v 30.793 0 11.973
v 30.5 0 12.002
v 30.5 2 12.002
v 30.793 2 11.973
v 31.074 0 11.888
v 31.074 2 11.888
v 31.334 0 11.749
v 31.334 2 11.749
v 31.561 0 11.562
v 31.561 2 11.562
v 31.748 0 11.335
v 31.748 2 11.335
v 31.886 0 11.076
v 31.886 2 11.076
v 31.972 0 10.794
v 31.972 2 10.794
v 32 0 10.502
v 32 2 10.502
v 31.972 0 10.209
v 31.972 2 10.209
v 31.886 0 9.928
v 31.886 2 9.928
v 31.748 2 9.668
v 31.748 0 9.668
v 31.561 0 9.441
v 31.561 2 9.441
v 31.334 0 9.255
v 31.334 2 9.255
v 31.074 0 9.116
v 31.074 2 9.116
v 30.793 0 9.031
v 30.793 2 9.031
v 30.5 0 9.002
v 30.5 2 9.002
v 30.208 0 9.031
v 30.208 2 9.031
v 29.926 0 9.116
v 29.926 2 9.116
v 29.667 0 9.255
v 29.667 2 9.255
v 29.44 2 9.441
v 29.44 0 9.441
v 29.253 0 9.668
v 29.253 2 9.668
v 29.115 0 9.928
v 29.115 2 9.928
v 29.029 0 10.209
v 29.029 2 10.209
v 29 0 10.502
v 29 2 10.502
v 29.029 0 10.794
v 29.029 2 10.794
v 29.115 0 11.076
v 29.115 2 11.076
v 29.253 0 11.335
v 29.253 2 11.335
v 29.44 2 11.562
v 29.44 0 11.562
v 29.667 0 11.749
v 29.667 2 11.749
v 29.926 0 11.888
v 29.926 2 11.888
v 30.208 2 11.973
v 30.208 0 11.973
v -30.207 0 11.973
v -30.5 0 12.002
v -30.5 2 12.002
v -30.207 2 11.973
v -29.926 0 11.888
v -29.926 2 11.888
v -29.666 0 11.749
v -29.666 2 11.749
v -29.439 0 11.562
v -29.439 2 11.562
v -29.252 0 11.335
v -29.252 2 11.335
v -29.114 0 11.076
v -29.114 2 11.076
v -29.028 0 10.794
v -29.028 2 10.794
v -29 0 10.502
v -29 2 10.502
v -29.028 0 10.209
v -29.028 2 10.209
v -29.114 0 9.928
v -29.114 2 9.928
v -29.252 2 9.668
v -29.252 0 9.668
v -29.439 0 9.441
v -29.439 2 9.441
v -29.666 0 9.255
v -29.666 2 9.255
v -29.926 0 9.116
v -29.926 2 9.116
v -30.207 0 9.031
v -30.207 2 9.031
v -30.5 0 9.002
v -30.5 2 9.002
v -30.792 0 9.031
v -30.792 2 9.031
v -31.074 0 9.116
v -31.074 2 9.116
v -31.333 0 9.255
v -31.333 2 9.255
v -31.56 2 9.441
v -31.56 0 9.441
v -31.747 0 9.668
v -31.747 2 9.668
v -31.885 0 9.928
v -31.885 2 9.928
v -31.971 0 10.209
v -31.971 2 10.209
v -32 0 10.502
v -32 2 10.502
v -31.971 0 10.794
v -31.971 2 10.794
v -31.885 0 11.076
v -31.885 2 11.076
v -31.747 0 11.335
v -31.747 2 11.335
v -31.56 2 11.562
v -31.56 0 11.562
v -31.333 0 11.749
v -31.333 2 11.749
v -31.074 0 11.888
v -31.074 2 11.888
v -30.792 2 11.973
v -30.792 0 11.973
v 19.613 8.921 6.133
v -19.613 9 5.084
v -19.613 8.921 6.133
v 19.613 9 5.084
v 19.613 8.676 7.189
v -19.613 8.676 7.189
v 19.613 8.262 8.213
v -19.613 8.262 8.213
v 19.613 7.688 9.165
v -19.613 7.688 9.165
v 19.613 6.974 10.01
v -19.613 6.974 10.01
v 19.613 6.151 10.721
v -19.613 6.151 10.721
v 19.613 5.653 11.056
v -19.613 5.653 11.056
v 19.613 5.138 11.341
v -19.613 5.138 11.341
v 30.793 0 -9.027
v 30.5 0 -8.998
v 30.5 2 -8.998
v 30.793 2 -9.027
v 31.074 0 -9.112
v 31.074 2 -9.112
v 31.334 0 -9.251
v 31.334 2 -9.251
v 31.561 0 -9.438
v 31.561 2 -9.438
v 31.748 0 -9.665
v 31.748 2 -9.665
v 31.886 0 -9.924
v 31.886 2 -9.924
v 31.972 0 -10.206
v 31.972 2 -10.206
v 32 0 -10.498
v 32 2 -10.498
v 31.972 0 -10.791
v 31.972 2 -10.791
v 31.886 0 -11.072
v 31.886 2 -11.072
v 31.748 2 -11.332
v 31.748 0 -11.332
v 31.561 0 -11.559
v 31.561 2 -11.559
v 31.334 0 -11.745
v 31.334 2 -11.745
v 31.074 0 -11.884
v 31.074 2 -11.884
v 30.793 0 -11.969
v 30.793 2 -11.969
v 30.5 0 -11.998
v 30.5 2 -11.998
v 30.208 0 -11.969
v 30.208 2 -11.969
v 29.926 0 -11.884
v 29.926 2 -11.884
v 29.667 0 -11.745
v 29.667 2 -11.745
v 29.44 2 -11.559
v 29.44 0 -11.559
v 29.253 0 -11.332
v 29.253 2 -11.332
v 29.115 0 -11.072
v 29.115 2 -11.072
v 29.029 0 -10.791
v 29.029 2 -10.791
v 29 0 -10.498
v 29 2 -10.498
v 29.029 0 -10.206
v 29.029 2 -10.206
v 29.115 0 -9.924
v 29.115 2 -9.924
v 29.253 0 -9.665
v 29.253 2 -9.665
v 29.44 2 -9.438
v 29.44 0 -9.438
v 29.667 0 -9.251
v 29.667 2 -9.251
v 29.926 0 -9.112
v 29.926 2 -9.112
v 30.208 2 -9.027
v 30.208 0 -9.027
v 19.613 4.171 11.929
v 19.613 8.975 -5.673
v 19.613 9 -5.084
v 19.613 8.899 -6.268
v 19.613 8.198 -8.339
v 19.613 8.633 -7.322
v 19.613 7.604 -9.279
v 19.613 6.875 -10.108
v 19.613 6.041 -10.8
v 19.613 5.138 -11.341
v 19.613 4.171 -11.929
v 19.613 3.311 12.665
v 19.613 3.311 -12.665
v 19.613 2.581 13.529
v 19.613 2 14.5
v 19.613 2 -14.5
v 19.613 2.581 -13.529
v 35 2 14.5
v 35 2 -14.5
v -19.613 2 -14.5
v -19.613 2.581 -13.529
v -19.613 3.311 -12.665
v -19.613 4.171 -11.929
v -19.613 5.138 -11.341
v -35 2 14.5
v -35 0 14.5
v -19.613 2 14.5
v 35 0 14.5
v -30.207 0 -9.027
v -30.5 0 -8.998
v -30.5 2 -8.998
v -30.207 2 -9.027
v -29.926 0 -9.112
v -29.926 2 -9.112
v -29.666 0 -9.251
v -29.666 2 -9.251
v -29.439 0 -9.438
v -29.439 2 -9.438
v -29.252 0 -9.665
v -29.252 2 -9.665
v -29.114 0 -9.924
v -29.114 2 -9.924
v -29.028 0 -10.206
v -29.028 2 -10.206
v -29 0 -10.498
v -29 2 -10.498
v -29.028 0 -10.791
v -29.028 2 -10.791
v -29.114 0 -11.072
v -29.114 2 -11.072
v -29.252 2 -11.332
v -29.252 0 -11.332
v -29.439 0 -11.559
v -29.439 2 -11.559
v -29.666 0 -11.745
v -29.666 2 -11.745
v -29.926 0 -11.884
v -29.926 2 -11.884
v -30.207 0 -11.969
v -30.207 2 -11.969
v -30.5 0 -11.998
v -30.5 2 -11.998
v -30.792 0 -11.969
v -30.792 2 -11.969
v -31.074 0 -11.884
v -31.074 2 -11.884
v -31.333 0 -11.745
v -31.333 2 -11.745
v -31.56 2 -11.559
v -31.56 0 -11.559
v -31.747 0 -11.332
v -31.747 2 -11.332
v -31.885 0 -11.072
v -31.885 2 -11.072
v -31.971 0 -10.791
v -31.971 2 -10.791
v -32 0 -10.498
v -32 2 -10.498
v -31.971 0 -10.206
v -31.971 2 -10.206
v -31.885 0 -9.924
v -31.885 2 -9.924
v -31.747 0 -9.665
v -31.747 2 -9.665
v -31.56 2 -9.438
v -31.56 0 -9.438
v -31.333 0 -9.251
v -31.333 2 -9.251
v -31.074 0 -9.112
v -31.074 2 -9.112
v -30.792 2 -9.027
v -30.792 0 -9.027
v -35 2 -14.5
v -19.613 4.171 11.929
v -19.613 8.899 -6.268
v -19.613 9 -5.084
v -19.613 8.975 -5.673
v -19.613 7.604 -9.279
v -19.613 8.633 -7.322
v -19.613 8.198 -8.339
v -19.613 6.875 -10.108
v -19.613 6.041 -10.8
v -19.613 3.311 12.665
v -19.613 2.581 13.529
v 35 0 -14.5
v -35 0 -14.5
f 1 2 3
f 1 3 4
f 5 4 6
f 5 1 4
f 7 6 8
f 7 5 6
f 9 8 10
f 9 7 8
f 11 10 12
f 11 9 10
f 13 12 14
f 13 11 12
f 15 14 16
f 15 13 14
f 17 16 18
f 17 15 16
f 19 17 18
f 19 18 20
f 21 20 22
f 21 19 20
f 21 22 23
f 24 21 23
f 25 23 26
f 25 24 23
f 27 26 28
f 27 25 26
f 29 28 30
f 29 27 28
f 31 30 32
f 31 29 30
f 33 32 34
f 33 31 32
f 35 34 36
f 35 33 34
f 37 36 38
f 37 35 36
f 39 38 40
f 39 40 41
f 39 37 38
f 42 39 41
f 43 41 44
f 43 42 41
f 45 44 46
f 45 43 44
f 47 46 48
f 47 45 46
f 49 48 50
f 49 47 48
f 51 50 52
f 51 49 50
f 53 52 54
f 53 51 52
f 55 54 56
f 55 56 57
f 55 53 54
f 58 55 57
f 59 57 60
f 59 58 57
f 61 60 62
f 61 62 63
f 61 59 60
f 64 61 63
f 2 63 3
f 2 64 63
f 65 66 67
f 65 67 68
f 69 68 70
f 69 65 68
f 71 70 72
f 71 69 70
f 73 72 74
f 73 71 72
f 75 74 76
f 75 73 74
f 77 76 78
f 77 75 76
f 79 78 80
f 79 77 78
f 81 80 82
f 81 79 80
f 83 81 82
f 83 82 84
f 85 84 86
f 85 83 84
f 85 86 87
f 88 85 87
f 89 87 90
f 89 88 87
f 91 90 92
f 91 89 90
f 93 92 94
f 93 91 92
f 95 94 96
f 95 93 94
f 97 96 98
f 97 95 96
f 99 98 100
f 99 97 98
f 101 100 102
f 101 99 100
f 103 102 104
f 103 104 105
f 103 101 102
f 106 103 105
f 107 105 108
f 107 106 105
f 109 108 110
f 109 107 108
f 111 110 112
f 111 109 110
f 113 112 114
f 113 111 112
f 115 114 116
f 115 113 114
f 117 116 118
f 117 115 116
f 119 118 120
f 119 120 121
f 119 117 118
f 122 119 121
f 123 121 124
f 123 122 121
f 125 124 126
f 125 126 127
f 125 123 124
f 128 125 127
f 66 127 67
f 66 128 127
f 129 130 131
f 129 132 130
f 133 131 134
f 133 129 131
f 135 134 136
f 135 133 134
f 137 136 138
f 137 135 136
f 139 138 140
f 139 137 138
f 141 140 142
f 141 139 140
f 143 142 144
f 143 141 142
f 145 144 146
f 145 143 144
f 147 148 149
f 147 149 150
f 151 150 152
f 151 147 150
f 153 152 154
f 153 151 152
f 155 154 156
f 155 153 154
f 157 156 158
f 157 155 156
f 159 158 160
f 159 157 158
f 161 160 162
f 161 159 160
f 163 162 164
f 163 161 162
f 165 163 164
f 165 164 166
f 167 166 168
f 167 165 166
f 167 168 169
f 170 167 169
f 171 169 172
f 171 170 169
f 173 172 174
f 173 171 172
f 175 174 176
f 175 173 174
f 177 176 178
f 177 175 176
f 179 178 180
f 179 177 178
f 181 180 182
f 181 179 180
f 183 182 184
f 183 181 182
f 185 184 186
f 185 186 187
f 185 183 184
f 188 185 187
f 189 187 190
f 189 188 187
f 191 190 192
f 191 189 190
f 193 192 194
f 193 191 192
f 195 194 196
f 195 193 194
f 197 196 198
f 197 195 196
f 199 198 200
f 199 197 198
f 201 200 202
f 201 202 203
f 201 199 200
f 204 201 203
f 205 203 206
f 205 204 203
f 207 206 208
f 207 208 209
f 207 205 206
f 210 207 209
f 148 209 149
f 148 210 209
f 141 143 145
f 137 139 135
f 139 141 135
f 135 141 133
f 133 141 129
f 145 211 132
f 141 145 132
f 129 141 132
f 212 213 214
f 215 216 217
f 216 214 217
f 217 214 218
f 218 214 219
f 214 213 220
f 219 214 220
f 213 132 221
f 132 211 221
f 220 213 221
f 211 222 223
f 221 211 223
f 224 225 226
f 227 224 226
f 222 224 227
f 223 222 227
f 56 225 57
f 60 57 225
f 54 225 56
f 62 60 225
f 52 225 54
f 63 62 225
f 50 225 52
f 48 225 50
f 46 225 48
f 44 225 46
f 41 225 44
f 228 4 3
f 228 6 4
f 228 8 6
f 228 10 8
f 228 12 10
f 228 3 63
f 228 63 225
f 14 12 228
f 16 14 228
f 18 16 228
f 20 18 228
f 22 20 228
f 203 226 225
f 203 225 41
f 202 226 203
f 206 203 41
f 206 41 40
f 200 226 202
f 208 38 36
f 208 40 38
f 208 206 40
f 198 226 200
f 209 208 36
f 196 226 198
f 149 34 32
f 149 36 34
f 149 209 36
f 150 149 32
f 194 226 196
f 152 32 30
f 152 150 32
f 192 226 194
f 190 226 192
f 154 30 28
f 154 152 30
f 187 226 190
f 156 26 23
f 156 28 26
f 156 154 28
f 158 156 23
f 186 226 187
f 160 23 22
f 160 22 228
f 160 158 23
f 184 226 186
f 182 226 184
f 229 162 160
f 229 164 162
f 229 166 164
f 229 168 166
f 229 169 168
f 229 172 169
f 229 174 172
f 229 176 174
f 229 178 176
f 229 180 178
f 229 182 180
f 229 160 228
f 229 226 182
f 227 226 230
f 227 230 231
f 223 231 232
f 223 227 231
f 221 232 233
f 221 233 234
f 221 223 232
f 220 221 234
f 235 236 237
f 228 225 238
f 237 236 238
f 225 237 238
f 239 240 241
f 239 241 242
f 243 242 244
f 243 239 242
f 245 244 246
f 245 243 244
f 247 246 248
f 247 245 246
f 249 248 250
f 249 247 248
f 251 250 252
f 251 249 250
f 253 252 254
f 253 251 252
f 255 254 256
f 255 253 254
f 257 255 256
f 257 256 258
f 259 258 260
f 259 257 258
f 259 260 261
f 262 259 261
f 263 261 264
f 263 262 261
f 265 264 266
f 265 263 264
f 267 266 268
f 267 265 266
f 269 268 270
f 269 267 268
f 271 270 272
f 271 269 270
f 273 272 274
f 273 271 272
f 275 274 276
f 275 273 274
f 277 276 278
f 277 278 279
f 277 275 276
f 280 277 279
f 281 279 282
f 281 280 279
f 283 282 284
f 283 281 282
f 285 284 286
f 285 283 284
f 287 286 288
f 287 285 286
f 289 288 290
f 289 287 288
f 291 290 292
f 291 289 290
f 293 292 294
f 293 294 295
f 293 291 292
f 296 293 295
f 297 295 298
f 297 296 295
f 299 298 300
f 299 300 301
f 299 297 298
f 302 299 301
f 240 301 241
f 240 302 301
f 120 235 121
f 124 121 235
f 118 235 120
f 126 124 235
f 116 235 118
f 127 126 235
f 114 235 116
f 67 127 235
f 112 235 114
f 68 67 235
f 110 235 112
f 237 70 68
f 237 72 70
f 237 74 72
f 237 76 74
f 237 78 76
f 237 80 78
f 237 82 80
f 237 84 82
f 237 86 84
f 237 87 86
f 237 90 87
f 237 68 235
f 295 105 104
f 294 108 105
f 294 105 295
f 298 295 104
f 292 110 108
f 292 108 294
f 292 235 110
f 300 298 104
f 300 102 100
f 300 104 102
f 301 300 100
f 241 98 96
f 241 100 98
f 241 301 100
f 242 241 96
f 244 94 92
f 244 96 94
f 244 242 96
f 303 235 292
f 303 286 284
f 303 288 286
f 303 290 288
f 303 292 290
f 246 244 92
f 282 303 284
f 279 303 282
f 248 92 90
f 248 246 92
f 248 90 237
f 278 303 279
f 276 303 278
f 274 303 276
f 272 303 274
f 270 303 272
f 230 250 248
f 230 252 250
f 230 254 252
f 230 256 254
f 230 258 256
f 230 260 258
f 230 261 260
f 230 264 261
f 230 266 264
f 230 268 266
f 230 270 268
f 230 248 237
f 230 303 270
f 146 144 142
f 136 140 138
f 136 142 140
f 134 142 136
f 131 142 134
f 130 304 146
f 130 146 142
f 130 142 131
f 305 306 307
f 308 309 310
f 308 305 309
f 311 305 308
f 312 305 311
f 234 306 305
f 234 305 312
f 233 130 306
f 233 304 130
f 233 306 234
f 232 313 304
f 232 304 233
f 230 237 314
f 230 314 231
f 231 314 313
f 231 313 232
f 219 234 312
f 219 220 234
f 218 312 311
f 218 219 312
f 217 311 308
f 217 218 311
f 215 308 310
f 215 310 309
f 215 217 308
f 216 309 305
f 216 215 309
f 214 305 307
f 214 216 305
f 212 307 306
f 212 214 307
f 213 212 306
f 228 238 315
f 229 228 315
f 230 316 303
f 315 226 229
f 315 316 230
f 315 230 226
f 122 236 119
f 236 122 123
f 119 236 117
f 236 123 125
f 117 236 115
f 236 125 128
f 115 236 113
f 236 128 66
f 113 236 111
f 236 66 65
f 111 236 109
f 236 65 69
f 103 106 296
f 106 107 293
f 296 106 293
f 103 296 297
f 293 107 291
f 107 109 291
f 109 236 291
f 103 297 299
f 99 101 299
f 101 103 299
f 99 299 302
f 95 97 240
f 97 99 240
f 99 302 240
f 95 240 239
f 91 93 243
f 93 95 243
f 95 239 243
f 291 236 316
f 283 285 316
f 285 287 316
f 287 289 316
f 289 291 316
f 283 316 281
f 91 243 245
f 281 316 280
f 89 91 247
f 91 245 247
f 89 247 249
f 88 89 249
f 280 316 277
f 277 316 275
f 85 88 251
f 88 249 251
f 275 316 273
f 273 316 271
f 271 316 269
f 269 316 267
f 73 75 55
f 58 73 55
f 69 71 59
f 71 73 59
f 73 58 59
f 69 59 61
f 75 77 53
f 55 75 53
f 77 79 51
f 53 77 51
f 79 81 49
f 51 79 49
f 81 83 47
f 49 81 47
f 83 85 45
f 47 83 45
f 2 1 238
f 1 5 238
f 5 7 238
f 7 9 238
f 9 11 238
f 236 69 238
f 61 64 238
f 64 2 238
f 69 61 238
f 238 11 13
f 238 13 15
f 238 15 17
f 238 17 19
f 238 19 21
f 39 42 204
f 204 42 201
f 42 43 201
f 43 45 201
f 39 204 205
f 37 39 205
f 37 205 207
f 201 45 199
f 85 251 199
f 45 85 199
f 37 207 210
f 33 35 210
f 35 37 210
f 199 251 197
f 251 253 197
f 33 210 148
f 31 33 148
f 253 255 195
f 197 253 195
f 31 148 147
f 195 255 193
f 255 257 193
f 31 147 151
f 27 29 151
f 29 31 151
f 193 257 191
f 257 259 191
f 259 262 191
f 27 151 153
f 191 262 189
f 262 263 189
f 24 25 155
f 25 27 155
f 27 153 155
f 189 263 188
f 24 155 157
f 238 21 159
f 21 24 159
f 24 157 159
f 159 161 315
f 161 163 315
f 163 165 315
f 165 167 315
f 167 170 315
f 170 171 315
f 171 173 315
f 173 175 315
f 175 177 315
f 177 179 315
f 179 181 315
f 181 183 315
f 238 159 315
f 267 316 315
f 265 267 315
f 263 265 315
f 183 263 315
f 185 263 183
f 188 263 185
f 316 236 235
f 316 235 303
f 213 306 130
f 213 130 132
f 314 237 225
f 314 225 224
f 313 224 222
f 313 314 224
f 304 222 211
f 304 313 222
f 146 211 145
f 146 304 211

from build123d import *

# Parameters (mm, degrees)
SKETCH1_W           = 70
SKETCH1_H           = 29
SKETCH1_R           = 1.5
BOSS_EXTRUDE1_DEPTH = 2
SKETCH3_W           = 39.225392784
SKETCH3_H           = 21.196798794
BOSS_EXTRUDE2_DEPTH = 7
FILLET2_R           = 7
FILLET3_R           = 7


with BuildPart() as part:
    # Sketch1 → Boss-Extrude1 (new body)
    with BuildSketch(Plane(origin=(0, 0, 0), x_dir=(1, 0, 0), z_dir=(0, 1, 0))):
        Rectangle(SKETCH1_W, SKETCH1_H)
        with Locations(Location((-30.499583195, 10.498163925, 0), (0, 0, 270))):
            Circle(SKETCH1_R, mode=Mode.SUBTRACT)
        with Locations(Location((30.500416805, 10.498163925, 0), (0, 0, 270))):
            Circle(SKETCH1_R, mode=Mode.SUBTRACT)
        with Locations(Location((-30.499583195, -10.501836075, 0), (0, 0, 270))):
            Circle(SKETCH1_R, mode=Mode.SUBTRACT)
        with Locations(Location((30.500416805, -10.501836075, 0), (0, 0, 270))):
            Circle(SKETCH1_R, mode=Mode.SUBTRACT)
    extrude(amount=BOSS_EXTRUDE1_DEPTH)

    # Sketch3 → Boss-Extrude2 (add)
    with BuildSketch(Plane(origin=(0, 2, 0), x_dir=(1, 0, 0), z_dir=(0, 1, 0))):
        Rectangle(SKETCH3_W, SKETCH3_H)
    extrude(amount=BOSS_EXTRUDE2_DEPTH)

    # Fillet2
    # the kernel refuses this fillet: 7 mm, written as the material it adds along each edge
    with BuildSketch(Plane(origin=(-19.612696392, 2, 10.598399397), x_dir=(0, 0, 1), z_dir=(1, 0, 0)), Plane(origin=(19.612696392, 2, -10.598399397), x_dir=(0, 0, -1), z_dir=(-1, 0, 0))) as fillet2_piece_1:
        with BuildLine():
            CenterArc((7, -6.276935652), FILLET2_R, 116.271709478, 63.728290522)
            Line((0, -6.276935652), (-0.14, -6.276935652))
            Line((-0.14, -6.276935652), (-0.14, 0))
            Line((-0.14, 0), (0, 0.14))
            ThreePointArc((0, 0.14), (1.950800302, 0.14), (3.839632616, 0.125538713))
            Line((3.839632616, 0.125538713), (3.901600603, 0))
        make_face()
    extrude(amount=39.225392784)

    # Fillet3
    fillet3_edges = [part.edges().sort_by_distance(p)[0] for p in [
        (0, 9, -10.598399397),
        (0, 9, 10.598399397),
    ]]
    fillet(fillet3_edges, radius=FILLET3_R)


solid = part.part
